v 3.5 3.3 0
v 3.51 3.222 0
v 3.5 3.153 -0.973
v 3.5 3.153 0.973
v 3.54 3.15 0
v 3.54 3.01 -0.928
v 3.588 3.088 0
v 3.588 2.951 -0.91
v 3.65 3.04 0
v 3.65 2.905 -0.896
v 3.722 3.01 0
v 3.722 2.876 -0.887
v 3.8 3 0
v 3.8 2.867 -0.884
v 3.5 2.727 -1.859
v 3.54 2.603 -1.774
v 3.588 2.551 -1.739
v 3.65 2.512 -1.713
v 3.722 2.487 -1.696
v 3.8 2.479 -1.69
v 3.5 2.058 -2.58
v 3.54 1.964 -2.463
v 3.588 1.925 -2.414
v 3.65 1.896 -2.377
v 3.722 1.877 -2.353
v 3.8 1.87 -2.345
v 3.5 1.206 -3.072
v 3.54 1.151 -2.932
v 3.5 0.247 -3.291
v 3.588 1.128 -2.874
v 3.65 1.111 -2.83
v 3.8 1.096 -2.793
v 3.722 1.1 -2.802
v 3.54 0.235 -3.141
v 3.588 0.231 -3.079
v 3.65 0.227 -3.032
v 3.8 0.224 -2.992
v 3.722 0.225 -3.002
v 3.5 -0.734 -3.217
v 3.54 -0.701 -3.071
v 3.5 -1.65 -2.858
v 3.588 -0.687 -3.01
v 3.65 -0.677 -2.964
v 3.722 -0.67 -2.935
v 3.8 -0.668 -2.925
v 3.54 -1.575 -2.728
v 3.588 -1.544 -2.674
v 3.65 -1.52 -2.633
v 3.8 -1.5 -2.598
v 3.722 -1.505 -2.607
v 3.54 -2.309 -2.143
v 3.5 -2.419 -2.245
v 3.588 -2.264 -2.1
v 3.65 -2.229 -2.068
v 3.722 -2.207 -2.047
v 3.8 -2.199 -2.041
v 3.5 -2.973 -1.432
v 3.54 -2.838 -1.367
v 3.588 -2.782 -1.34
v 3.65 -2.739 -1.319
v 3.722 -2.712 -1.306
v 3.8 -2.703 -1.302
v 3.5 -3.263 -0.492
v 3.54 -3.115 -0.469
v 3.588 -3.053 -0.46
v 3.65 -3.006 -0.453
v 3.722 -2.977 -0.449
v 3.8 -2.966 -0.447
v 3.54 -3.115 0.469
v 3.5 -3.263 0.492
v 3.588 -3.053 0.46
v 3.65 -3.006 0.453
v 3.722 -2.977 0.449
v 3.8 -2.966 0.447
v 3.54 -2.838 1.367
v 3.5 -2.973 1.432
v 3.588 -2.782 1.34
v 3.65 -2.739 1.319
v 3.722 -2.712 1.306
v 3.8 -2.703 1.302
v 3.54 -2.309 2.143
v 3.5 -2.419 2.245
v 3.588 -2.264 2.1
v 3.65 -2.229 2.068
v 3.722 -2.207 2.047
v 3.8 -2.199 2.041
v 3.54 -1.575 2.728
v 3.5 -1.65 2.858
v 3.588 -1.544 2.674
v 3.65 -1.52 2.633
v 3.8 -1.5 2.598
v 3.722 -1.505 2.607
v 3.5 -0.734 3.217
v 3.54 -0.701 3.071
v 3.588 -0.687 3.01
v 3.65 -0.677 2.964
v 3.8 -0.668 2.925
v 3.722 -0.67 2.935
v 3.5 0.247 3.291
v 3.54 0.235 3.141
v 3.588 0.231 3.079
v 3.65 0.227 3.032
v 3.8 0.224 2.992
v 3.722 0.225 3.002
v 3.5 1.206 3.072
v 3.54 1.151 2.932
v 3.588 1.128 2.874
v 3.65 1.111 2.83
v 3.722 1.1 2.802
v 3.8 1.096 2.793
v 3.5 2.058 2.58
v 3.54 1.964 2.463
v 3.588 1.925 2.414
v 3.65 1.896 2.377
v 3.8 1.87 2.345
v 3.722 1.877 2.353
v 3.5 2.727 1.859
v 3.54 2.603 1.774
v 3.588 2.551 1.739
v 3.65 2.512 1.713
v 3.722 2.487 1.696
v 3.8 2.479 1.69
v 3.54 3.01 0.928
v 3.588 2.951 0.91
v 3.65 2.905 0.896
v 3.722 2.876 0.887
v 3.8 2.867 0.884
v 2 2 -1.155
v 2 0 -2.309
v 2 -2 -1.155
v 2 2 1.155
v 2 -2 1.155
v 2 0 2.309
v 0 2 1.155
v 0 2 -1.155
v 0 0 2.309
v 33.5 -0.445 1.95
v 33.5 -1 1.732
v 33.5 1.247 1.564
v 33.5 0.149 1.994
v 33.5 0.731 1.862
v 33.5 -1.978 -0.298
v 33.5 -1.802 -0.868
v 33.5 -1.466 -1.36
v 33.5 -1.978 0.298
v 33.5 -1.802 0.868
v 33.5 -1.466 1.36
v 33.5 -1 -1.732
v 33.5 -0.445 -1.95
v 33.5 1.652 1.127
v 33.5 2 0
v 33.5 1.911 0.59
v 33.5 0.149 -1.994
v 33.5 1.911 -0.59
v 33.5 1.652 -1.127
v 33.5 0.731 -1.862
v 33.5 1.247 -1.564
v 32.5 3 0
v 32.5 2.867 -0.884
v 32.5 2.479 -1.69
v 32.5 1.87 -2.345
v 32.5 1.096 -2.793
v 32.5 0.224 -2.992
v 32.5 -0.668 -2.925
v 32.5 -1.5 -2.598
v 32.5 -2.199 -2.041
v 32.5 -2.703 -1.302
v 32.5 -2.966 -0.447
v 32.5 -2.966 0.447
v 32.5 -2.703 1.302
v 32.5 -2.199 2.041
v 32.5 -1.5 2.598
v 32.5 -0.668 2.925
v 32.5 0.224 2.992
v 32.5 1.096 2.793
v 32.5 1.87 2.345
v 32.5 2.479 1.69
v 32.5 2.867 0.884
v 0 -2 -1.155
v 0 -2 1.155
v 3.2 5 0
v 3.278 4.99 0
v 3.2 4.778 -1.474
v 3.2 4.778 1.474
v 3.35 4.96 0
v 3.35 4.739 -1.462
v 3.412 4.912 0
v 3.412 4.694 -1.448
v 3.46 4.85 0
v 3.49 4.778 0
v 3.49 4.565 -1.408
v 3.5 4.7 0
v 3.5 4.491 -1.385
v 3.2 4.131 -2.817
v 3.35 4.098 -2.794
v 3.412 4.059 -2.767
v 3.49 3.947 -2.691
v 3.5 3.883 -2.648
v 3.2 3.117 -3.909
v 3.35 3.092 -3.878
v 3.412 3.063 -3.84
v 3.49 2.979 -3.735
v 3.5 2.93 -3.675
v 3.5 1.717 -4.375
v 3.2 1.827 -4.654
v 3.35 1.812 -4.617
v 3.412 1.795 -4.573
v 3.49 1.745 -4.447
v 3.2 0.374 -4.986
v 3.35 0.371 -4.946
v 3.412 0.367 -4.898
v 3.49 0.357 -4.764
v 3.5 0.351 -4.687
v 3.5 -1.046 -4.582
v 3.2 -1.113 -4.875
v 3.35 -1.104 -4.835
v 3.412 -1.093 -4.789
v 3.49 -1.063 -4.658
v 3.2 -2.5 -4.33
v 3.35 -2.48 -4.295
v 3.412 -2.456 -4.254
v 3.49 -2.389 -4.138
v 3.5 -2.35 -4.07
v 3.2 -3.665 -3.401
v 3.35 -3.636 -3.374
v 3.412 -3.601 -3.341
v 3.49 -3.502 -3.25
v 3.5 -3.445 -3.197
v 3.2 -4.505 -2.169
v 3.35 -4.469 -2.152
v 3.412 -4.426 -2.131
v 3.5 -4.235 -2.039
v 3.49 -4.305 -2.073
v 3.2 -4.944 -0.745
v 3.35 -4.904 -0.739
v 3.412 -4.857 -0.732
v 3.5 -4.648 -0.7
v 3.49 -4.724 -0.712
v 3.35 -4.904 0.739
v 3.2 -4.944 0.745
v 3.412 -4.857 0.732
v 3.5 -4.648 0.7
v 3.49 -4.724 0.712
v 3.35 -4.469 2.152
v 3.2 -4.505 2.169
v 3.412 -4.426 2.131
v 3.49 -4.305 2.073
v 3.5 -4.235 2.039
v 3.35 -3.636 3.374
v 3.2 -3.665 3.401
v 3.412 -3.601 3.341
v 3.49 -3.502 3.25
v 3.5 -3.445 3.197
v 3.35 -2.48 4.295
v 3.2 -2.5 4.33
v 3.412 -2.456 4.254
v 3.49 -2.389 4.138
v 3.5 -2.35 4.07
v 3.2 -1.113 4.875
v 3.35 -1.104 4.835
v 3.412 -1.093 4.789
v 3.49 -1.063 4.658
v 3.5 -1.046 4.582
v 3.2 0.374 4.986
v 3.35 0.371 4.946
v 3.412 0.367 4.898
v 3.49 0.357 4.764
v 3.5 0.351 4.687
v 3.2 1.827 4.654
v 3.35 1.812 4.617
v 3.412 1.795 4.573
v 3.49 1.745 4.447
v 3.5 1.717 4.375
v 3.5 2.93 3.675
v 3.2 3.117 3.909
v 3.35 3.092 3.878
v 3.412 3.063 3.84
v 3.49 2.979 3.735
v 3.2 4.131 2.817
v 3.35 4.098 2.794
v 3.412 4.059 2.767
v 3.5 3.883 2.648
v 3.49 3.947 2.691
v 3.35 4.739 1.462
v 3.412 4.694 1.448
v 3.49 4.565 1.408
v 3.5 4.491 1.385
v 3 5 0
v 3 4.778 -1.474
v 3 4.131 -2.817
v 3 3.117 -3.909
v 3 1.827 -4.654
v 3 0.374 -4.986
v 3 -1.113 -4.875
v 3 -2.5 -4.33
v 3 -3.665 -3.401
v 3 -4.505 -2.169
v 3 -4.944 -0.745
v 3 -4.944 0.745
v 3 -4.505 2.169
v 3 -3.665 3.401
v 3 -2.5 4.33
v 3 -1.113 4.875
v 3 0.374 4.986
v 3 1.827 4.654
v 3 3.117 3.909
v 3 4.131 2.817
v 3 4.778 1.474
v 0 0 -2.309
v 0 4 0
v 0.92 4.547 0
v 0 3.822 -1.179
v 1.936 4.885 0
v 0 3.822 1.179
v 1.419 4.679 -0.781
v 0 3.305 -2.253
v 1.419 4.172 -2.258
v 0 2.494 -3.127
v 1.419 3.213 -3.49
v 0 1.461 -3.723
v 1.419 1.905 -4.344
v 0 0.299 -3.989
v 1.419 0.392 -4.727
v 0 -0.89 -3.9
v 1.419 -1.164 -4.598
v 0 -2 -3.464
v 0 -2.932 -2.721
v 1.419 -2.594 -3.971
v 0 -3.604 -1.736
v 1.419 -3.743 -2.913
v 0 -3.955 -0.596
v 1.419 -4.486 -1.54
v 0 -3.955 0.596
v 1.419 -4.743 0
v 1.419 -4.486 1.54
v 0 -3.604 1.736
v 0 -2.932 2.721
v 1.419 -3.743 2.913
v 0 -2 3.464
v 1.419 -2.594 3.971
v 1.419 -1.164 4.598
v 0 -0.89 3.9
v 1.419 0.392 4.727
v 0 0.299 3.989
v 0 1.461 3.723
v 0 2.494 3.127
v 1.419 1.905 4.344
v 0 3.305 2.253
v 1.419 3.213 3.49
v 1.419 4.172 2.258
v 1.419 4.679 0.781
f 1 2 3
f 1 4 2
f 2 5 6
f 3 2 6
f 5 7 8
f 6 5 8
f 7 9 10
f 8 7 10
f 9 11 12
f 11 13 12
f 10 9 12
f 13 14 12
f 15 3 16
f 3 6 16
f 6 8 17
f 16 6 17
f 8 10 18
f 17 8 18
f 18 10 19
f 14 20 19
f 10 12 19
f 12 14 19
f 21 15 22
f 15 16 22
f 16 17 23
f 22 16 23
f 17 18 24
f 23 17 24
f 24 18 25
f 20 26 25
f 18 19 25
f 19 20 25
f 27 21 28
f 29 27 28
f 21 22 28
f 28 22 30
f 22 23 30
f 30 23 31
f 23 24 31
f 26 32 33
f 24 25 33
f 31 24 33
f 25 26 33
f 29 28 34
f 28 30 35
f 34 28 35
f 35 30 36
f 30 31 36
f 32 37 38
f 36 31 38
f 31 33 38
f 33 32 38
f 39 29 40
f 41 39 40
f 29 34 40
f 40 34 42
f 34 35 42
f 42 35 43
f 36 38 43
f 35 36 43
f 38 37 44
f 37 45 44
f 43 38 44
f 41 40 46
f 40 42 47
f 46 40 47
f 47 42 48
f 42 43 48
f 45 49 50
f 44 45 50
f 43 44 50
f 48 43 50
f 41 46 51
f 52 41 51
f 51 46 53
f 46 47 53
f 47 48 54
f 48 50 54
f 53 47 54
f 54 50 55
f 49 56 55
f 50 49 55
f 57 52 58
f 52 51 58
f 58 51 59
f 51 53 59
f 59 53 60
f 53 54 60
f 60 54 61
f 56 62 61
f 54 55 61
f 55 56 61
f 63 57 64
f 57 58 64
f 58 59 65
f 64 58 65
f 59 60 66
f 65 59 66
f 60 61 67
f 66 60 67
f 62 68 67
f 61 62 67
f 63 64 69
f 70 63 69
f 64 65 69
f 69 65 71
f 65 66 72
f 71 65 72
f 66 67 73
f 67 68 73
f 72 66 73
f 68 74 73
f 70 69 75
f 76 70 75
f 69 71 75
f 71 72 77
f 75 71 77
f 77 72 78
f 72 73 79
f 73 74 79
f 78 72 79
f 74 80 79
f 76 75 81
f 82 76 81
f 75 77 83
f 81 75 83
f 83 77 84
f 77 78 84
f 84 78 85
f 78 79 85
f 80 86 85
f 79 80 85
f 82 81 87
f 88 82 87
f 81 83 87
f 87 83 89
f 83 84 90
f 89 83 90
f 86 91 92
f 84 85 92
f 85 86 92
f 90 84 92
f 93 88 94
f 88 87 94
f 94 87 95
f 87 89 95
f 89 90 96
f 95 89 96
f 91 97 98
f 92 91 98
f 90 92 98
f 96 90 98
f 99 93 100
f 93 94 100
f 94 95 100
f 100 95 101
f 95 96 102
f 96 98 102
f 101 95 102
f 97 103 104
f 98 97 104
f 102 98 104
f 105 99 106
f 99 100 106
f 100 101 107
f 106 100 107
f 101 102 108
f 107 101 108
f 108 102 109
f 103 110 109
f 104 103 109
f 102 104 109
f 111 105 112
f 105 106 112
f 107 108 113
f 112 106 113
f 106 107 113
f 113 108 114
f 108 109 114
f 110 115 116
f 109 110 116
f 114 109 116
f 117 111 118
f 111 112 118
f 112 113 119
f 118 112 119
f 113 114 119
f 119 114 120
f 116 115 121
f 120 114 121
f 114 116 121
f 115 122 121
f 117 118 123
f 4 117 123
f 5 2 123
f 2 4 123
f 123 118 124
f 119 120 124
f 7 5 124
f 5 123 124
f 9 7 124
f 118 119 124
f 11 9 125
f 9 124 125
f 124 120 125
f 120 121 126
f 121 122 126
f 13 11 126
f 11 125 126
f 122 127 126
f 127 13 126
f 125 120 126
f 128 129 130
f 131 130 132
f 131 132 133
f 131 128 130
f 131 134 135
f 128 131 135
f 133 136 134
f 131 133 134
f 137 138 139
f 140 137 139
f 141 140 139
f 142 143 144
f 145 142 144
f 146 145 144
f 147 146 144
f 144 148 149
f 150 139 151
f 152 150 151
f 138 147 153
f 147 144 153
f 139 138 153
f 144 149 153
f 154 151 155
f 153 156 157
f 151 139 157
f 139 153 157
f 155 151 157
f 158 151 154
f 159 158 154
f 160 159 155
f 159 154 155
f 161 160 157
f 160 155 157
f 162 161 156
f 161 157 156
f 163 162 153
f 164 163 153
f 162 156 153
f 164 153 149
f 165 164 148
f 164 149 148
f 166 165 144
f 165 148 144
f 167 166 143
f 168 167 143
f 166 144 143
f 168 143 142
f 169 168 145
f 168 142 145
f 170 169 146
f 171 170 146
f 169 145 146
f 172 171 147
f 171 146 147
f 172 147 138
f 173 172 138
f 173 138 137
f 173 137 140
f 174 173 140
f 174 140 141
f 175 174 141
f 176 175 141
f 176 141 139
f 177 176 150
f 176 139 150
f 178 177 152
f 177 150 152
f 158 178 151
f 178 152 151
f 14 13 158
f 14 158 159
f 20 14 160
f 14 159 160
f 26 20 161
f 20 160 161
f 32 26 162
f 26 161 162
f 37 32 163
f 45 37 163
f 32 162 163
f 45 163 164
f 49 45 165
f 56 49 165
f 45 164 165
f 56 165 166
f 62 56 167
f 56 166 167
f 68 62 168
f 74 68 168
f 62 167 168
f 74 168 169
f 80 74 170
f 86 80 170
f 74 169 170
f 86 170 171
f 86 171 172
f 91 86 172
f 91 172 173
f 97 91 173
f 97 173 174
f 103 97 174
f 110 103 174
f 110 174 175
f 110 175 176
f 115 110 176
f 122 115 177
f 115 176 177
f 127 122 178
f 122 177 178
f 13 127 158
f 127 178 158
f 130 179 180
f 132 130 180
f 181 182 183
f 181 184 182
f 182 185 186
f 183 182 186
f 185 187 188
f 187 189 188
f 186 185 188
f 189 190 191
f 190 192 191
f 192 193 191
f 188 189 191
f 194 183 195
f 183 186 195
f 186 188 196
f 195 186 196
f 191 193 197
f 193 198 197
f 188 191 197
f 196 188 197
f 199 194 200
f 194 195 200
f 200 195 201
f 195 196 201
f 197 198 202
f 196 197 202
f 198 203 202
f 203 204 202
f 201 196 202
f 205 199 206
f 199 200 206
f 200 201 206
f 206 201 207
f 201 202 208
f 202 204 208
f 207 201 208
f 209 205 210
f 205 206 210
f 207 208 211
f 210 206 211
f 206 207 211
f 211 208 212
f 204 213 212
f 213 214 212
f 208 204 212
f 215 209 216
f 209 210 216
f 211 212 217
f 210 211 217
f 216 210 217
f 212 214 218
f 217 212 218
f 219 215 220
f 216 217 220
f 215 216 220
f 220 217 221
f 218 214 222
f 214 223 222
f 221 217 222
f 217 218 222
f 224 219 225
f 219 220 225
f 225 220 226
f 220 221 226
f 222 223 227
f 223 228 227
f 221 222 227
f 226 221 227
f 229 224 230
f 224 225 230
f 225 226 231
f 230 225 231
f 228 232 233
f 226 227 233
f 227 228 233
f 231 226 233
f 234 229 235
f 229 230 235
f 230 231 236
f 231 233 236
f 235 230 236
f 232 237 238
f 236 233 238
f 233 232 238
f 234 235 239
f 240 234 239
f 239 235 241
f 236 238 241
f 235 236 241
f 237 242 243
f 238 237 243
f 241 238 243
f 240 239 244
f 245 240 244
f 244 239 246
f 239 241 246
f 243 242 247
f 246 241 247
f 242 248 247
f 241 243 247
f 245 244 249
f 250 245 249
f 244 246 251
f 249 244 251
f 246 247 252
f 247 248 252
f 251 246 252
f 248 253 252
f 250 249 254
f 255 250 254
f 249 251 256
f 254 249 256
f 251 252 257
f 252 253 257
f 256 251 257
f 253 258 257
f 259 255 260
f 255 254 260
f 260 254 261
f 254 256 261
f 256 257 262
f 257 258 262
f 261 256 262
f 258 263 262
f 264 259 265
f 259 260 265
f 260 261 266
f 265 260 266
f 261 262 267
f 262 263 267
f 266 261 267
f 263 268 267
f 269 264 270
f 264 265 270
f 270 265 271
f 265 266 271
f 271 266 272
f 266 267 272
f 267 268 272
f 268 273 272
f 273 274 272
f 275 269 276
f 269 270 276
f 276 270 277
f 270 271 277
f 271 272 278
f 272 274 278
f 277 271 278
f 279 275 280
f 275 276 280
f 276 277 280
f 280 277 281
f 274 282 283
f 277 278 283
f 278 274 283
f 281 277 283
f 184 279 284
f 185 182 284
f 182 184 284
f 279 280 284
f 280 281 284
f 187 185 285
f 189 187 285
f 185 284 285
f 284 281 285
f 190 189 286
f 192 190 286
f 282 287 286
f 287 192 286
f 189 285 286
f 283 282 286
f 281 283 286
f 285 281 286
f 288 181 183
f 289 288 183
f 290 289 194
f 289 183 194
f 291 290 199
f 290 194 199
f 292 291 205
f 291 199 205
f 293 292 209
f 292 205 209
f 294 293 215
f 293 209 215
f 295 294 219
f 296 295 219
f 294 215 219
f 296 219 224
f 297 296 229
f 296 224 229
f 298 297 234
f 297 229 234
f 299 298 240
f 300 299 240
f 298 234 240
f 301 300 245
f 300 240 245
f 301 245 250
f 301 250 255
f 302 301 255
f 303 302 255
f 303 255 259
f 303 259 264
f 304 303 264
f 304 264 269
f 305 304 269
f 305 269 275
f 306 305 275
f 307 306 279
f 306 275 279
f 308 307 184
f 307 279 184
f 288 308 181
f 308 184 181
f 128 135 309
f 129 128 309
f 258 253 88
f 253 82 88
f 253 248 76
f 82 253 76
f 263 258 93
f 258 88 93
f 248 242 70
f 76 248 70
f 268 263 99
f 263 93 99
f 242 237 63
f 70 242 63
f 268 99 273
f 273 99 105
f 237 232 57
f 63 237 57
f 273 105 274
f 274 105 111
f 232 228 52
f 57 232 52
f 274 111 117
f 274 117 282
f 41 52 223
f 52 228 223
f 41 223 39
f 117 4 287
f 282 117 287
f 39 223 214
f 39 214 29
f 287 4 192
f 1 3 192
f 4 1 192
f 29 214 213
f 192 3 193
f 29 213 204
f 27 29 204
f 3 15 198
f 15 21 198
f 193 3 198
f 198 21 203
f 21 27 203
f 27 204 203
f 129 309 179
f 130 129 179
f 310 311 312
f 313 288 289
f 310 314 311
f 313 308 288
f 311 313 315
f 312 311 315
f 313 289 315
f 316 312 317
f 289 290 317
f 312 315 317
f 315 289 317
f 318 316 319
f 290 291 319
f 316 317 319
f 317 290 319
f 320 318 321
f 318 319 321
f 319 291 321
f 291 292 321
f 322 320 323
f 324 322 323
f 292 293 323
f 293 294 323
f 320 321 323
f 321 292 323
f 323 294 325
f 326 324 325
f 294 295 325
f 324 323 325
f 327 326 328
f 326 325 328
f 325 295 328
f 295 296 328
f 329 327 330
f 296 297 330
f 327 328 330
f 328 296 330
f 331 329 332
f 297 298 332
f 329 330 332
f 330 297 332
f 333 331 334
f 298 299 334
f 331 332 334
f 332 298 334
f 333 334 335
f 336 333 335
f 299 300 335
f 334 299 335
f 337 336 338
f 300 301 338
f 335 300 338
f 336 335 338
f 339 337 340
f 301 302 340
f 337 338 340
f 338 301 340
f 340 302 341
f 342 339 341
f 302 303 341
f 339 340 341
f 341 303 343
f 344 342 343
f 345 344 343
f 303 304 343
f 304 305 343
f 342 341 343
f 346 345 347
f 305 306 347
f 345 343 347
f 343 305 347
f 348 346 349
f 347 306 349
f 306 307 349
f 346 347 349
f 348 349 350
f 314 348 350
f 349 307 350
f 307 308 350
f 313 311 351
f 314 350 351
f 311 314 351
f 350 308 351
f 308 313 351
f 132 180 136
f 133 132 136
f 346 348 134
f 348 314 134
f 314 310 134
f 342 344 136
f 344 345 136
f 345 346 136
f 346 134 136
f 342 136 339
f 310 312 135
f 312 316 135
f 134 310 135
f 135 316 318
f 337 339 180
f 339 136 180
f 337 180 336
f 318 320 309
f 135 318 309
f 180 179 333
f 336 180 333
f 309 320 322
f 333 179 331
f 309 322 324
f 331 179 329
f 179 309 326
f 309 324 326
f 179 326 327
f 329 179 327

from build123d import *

# Parameters (mm, degrees)
CUT_EXTRUDE_1_DEPTH = 2
FILLET_1_R          = 0.3
CHAMFER_1_SIZE      = 1


with BuildPart() as part:
    # Эскиз1 → Повернуть1 (revolve)
    with BuildSketch(Plane.XY):
        with BuildLine():
            Line((0, 0), (0, 4))
            ThreePointArc((0, 4), (1.41886117, 4.74341649), (3, 5))
            Line((3, 5), (3.5, 5))
            Line((3.5, 5), (3.5, 3))
            Line((3.5, 3), (33.5, 3))
            Line((33.5, 3), (33.5, 0))
            Line((33.5, 0), (0, 0))
        make_face()
    revolve(axis=Axis((33.5, 0, 0), (-1, 0, 0)))

    # Эскиз2 → Вырез-Вытянуть1 (cut)
    with BuildSketch(Plane.ZY):
        Polygon((1.154700538, 2), (-1.154700538, 2), (-2.309401077, 0), (-1.154700538, -2), (1.154700538, -2), (2.309401077, 0), align=None)
    extrude(amount=-CUT_EXTRUDE_1_DEPTH, mode=Mode.SUBTRACT)

    # Скругление1
    fillet_1_edges = [part.edges().sort_by_distance(p)[0] for p in [
        (3.5, -3, 0),
        (3.5, -5, 0),
    ]]
    fillet(fillet_1_edges, radius=FILLET_1_R)

    # Фаска1
    chamfer_1_edges = [part.edges().sort_by_distance(p)[0] for p in [
        (33.5, -3, 0),
    ]]
    chamfer(chamfer_1_edges, length=CHAMFER_1_SIZE)


solid = part.part
